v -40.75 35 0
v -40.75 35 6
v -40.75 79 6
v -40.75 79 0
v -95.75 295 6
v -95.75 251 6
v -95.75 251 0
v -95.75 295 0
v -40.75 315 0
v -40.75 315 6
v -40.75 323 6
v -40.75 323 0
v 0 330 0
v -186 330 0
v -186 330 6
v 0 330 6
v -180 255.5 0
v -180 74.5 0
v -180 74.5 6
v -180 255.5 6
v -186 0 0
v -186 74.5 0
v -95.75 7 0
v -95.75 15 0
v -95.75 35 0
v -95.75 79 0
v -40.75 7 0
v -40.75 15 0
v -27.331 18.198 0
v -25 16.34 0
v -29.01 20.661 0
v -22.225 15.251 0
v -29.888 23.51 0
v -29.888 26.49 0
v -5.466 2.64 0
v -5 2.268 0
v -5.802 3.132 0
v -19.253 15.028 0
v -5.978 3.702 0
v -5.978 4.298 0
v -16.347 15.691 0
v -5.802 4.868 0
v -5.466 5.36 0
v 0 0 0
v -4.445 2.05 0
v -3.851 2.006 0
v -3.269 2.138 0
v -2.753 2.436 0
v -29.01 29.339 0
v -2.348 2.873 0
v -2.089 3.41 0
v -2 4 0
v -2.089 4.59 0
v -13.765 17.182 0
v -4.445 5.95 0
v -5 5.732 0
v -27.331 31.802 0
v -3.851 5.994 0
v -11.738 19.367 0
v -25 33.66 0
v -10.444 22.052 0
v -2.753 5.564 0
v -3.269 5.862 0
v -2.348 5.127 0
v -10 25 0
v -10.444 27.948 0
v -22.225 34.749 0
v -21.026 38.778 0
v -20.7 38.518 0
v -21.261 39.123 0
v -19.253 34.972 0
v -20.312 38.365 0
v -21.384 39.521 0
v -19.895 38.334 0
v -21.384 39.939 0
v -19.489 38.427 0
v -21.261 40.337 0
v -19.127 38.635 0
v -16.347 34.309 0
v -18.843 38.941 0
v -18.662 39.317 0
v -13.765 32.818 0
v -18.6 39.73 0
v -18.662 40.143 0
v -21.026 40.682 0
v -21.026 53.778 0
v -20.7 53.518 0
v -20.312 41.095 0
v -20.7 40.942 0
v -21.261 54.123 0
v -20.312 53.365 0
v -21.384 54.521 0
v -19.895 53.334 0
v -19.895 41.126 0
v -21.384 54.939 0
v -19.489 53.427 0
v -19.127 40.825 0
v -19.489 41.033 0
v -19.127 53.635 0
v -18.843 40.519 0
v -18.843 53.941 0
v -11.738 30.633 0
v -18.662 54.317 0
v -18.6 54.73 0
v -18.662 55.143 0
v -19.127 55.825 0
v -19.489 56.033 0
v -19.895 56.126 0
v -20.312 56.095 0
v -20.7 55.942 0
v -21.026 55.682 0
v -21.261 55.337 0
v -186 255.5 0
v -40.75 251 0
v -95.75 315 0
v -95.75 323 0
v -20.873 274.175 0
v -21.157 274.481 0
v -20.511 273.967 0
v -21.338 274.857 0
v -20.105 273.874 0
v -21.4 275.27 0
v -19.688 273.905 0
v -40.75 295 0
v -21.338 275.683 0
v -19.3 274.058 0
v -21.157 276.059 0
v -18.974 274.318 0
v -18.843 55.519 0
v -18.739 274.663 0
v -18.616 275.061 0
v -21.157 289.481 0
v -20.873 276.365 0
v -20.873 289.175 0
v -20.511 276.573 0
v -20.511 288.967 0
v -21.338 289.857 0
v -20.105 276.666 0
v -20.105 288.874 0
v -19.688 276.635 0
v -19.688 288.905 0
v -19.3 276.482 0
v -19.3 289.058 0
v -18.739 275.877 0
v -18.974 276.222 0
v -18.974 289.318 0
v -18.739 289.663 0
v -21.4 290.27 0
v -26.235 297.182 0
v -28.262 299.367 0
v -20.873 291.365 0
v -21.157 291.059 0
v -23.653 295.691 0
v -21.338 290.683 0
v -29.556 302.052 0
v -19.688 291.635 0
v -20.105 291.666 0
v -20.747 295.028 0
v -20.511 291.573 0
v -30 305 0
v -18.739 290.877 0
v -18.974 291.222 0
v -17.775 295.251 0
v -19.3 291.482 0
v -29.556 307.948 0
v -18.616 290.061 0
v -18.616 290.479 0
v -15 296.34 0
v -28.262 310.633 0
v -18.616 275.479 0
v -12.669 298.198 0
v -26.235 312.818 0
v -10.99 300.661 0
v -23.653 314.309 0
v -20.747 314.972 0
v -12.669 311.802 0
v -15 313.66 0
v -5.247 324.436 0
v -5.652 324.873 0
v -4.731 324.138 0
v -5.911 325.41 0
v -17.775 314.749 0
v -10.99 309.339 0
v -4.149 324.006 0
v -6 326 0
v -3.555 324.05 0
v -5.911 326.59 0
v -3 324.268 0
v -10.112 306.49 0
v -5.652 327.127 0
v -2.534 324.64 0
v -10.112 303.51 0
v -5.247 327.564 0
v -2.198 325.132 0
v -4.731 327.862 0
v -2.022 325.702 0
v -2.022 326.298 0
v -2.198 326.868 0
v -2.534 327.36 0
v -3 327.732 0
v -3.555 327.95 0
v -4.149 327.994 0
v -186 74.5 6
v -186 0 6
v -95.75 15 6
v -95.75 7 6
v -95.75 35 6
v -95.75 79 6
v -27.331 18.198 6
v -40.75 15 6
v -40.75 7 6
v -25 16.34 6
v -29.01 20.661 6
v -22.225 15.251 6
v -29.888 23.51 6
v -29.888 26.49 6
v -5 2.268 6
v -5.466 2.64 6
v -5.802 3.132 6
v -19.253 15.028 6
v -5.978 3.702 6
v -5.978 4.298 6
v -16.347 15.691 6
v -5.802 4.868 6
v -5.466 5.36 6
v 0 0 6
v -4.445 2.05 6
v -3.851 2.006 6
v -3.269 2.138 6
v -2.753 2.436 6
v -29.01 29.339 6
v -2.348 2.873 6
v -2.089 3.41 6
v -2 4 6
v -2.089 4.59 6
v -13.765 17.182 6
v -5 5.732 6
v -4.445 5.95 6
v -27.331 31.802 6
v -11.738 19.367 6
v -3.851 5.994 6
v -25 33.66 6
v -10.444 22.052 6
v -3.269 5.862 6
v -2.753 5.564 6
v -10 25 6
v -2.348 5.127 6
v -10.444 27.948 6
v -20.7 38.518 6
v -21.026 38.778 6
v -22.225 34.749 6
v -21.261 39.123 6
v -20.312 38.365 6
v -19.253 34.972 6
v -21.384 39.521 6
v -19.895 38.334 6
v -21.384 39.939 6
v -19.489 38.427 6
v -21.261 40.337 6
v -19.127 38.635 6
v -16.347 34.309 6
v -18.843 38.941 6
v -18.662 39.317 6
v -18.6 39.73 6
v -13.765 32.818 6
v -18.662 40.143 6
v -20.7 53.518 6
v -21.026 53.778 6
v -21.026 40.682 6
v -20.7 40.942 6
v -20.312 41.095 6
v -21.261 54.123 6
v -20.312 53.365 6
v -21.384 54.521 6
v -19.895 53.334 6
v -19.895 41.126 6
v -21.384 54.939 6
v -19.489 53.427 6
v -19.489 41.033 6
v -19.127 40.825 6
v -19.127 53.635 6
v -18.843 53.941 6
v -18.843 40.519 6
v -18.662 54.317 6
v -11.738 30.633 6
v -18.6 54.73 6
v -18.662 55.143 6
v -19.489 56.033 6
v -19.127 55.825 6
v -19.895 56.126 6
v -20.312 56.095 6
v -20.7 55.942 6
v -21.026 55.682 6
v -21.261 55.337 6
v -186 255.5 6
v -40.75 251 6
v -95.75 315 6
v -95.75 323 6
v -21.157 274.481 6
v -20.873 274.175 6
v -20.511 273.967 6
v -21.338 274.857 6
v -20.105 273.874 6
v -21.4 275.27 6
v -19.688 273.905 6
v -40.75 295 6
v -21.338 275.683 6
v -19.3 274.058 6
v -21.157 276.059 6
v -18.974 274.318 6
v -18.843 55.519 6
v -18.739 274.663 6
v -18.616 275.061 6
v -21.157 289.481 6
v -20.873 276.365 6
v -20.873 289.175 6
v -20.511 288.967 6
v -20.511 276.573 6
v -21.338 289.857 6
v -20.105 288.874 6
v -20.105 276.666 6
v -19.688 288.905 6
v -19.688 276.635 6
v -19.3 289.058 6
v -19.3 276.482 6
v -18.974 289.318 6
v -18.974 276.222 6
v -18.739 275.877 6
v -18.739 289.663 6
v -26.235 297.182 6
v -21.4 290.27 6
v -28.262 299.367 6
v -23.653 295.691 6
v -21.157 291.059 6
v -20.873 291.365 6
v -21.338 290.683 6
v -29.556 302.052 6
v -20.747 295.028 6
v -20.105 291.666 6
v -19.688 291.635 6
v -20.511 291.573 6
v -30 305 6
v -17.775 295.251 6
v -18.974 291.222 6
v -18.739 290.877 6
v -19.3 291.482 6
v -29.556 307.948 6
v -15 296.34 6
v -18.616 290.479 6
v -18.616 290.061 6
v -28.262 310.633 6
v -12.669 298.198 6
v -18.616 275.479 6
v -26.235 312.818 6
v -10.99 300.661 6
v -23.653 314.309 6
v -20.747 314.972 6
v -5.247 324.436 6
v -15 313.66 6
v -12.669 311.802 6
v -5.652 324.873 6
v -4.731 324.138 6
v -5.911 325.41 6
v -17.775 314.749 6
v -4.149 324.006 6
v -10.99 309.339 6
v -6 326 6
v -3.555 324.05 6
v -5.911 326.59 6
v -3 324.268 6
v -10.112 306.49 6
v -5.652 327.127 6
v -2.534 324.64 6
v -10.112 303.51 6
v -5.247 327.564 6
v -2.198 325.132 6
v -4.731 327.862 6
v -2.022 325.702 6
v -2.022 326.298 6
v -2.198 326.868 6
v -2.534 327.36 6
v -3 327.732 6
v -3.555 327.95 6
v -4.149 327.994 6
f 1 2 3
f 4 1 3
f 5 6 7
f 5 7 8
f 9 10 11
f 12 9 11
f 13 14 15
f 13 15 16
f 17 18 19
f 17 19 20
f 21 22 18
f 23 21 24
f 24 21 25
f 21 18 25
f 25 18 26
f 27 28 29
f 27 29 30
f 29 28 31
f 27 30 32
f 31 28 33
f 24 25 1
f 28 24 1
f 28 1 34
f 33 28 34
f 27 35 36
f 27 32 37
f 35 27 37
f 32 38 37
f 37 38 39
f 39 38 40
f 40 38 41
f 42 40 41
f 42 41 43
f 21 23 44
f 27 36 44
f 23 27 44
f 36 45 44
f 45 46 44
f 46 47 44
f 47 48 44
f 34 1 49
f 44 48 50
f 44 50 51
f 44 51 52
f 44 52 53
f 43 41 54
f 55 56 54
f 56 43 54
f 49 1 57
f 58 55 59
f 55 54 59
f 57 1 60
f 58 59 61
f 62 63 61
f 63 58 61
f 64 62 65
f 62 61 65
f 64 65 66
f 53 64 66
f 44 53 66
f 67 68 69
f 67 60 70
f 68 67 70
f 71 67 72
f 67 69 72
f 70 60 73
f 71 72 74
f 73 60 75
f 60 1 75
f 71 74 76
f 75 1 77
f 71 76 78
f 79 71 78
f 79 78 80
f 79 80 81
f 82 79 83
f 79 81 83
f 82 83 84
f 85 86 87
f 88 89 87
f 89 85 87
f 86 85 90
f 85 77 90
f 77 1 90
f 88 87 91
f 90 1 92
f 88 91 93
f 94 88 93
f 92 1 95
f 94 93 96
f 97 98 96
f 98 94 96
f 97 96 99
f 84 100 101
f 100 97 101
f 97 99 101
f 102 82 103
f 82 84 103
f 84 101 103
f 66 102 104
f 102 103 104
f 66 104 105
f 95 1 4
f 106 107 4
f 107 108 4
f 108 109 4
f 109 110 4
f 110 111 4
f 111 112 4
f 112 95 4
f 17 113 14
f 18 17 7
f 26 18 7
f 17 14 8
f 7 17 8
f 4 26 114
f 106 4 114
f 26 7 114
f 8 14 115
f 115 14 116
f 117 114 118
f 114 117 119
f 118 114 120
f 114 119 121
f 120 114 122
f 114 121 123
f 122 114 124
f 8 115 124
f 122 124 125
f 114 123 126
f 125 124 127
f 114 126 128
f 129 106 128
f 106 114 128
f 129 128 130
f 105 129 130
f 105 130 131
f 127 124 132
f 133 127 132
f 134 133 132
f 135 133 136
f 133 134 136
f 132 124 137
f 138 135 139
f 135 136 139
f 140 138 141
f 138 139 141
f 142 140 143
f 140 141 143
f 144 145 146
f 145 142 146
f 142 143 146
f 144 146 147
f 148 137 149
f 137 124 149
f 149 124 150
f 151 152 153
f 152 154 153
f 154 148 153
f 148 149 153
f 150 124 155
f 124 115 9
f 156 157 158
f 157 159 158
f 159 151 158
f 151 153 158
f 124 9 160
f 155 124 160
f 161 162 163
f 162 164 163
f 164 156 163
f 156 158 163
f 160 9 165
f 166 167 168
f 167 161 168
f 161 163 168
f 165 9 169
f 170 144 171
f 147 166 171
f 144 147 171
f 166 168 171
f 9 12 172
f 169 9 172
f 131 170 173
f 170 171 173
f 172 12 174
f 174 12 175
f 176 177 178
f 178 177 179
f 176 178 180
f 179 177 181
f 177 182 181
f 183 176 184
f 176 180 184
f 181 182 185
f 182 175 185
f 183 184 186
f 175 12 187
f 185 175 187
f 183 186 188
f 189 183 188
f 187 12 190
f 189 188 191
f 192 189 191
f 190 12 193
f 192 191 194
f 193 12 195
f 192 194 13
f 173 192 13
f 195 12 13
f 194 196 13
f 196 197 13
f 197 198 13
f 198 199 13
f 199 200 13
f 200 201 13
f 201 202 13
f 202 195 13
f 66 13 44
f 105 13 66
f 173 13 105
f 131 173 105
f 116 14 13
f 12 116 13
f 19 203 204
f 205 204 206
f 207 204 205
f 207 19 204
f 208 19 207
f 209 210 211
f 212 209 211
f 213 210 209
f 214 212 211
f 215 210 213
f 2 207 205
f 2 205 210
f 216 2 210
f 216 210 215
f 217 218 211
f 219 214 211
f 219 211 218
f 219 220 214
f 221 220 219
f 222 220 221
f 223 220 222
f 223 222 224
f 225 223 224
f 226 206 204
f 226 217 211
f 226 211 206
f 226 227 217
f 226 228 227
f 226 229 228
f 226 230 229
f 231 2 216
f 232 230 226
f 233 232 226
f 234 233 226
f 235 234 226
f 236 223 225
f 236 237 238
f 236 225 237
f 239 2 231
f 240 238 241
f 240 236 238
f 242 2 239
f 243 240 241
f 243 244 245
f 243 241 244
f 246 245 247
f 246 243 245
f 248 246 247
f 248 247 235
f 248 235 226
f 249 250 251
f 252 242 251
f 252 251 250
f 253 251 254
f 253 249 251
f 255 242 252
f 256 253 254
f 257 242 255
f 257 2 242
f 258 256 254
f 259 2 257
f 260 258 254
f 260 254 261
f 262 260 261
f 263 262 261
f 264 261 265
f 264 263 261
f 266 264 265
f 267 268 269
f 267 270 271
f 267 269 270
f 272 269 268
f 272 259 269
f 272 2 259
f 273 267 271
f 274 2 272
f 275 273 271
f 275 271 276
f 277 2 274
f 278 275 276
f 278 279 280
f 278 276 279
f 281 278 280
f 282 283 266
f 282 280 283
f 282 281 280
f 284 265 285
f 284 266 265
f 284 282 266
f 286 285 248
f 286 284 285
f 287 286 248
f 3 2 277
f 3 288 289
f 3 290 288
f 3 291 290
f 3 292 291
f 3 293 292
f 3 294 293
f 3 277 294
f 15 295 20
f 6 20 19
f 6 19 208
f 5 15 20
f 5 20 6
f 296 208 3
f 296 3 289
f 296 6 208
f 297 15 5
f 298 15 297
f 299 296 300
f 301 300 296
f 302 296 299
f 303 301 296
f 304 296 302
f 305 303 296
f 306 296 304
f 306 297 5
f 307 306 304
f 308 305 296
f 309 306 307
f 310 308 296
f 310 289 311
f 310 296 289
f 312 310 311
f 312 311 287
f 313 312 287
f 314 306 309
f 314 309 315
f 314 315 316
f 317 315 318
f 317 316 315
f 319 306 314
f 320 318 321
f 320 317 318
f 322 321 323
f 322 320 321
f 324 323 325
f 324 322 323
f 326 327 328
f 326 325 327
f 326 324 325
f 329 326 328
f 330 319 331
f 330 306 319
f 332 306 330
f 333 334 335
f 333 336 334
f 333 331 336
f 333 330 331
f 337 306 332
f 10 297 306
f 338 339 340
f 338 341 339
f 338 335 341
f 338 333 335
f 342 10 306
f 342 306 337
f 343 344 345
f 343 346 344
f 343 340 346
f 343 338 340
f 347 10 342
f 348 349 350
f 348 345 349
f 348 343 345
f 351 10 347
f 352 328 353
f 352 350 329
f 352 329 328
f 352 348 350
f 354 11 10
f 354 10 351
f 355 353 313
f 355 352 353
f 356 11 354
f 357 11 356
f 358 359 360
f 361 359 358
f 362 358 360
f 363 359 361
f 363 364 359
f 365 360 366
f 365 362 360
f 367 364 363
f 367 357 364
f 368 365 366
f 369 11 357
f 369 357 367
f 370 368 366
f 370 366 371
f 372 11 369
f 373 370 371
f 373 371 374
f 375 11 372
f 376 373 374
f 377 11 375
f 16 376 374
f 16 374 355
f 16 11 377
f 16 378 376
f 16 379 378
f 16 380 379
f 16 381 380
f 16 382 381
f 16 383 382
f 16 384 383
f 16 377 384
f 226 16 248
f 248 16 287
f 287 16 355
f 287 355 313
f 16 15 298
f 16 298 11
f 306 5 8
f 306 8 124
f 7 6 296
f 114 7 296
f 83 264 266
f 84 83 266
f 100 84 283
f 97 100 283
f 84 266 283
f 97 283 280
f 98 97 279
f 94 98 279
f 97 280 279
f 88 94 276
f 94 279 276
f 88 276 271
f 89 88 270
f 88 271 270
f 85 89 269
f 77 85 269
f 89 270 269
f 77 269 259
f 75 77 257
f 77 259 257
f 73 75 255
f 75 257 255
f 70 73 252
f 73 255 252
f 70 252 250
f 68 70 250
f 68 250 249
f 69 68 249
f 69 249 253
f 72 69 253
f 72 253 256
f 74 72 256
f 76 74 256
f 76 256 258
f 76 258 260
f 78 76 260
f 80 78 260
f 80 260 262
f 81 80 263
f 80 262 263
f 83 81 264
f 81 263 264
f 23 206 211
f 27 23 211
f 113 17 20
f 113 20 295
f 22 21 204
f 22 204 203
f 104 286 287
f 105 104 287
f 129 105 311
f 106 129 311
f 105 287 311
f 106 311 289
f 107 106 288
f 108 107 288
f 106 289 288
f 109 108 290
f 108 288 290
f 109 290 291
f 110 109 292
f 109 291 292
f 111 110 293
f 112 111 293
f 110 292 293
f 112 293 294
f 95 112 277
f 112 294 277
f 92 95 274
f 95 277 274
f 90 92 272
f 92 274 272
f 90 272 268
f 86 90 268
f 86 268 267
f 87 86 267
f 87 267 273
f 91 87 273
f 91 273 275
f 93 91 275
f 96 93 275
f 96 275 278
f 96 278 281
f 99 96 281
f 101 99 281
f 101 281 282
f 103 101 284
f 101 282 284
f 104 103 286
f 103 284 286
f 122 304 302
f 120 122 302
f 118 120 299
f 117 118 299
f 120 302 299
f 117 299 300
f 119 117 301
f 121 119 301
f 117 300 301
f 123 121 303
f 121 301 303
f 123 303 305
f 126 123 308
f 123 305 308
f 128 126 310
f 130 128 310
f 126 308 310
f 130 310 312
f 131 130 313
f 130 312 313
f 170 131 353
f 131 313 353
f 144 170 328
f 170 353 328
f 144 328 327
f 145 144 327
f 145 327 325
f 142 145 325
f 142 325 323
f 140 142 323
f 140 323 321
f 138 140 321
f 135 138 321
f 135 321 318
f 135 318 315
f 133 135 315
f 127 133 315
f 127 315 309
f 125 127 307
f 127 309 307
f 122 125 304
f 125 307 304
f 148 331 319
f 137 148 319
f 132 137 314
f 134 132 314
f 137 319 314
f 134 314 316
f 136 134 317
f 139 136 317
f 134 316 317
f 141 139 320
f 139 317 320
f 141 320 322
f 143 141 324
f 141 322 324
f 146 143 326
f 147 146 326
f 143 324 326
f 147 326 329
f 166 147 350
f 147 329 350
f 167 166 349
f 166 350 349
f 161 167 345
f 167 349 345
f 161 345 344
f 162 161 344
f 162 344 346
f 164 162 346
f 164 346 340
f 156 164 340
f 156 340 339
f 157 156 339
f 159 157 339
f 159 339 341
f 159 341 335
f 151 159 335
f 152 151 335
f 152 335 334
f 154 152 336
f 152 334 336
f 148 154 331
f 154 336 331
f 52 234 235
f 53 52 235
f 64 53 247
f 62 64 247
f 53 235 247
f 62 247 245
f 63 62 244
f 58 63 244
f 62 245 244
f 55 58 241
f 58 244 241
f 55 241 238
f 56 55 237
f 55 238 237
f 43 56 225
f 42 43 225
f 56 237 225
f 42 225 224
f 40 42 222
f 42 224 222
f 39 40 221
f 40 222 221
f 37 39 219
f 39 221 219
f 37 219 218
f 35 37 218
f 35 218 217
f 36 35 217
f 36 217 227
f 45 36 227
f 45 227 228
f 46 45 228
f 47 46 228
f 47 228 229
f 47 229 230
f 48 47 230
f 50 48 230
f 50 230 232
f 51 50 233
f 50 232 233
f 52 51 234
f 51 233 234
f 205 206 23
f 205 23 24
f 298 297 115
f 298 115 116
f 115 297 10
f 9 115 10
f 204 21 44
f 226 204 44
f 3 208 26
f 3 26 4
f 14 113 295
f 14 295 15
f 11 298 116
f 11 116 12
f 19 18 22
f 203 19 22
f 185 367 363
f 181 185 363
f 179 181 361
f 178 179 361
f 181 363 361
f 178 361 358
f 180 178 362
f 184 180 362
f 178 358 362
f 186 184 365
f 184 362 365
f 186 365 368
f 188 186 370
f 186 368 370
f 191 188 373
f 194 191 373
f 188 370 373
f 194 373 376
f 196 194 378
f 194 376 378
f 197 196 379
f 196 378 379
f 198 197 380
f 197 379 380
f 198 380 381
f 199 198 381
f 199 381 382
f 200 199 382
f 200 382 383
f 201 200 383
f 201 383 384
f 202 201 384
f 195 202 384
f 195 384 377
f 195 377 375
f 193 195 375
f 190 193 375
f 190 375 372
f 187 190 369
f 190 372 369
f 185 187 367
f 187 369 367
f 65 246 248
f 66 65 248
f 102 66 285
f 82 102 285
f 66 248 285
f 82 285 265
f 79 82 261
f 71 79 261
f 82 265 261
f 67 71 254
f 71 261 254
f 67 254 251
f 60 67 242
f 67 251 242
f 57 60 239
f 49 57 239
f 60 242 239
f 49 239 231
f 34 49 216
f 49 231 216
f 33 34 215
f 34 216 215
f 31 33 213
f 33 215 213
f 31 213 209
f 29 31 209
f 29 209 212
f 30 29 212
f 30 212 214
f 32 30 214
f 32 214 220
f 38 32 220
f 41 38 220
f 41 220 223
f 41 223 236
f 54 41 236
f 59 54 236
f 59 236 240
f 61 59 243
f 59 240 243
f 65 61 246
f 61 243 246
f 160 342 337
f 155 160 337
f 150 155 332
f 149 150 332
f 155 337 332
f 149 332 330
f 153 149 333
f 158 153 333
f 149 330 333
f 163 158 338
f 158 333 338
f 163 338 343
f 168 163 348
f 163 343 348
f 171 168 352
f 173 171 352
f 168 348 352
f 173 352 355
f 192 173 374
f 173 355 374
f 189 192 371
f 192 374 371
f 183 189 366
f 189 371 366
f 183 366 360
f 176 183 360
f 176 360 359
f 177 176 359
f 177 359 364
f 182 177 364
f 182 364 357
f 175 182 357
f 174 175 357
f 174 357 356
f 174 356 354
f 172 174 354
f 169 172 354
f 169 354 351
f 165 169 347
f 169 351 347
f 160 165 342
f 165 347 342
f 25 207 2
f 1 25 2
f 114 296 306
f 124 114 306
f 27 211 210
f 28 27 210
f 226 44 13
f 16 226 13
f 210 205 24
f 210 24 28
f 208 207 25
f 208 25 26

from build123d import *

# Parameters (mm, degrees)
ESQUISSE1_W             = 186
ESQUISSE1_H             = 330
BOSS_EXTRU_1_DEPTH      = 6
ESQUISSE3_R             = 2
ESQUISSE3_R_2           = 10
ESQUISSE3_R_3           = 1.4
ESQUISSE3_W             = 55
ESQUISSE3_H             = 8
ESQUISSE3_H_2           = 44
ENL_V_MAT_EXTRU_2_DEPTH = 6
ESQUISSE4_W             = 6
ESQUISSE4_H             = 181
ENL_V_MAT_EXTRU_3_DEPTH = 379.856173237


with BuildPart() as part:
    # Esquisse1 → Boss.-Extru.1 (new body)
    with BuildSketch(Plane.XY):
        with Locations((-93, 165)):
            Rectangle(ESQUISSE1_W, ESQUISSE1_H)
    extrude(amount=BOSS_EXTRU_1_DEPTH)

    # Esquisse3 → Enlèv. mat.-Extru.2 (cut)
    with BuildSketch(Plane.XY.offset(6)):
        with Locations((-4, 4)):
            Circle(ESQUISSE3_R)
        with Locations((-20, 25)):
            Circle(ESQUISSE3_R_2)
        with Locations((-20, 39.73)):
            Circle(ESQUISSE3_R_3)
        with Locations((-20, 54.73)):
            Circle(ESQUISSE3_R_3)
        with Locations(Location((-20, 275.27, 0), (0, 0, 180))):
            Circle(ESQUISSE3_R_3)
        with Locations(Location((-20, 290.27, 0), (0, 0, 180))):
            Circle(ESQUISSE3_R_3)
        with Locations(Location((-4, 326, 0), (0, 0, 180))):
            Circle(ESQUISSE3_R)
        with Locations(Location((-20, 305, 0), (0, 0, 180))):
            Circle(ESQUISSE3_R_2)
        with Locations((-68.25, 11)):
            Rectangle(ESQUISSE3_W, ESQUISSE3_H)
        with Locations((-68.25, 57)):
            Rectangle(ESQUISSE3_W, ESQUISSE3_H_2)
        with Locations((-68.25, 273)):
            Rectangle(ESQUISSE3_W, ESQUISSE3_H_2)
        with Locations((-68.25, 319)):
            Rectangle(ESQUISSE3_W, ESQUISSE3_H)
    extrude(amount=-ENL_V_MAT_EXTRU_2_DEPTH, mode=Mode.SUBTRACT)

    # Esquisse4 → Enlèv. mat.-Extru.3 (cut, through all)
    with BuildSketch(Plane(origin=(0, 0, 0), x_dir=(-1, 0, 0), z_dir=(0, 0, -1))):
        with Locations((183, 165)):
            Rectangle(ESQUISSE4_W, ESQUISSE4_H)
    extrude(amount=-ENL_V_MAT_EXTRU_3_DEPTH, mode=Mode.SUBTRACT)


solid = part.part
